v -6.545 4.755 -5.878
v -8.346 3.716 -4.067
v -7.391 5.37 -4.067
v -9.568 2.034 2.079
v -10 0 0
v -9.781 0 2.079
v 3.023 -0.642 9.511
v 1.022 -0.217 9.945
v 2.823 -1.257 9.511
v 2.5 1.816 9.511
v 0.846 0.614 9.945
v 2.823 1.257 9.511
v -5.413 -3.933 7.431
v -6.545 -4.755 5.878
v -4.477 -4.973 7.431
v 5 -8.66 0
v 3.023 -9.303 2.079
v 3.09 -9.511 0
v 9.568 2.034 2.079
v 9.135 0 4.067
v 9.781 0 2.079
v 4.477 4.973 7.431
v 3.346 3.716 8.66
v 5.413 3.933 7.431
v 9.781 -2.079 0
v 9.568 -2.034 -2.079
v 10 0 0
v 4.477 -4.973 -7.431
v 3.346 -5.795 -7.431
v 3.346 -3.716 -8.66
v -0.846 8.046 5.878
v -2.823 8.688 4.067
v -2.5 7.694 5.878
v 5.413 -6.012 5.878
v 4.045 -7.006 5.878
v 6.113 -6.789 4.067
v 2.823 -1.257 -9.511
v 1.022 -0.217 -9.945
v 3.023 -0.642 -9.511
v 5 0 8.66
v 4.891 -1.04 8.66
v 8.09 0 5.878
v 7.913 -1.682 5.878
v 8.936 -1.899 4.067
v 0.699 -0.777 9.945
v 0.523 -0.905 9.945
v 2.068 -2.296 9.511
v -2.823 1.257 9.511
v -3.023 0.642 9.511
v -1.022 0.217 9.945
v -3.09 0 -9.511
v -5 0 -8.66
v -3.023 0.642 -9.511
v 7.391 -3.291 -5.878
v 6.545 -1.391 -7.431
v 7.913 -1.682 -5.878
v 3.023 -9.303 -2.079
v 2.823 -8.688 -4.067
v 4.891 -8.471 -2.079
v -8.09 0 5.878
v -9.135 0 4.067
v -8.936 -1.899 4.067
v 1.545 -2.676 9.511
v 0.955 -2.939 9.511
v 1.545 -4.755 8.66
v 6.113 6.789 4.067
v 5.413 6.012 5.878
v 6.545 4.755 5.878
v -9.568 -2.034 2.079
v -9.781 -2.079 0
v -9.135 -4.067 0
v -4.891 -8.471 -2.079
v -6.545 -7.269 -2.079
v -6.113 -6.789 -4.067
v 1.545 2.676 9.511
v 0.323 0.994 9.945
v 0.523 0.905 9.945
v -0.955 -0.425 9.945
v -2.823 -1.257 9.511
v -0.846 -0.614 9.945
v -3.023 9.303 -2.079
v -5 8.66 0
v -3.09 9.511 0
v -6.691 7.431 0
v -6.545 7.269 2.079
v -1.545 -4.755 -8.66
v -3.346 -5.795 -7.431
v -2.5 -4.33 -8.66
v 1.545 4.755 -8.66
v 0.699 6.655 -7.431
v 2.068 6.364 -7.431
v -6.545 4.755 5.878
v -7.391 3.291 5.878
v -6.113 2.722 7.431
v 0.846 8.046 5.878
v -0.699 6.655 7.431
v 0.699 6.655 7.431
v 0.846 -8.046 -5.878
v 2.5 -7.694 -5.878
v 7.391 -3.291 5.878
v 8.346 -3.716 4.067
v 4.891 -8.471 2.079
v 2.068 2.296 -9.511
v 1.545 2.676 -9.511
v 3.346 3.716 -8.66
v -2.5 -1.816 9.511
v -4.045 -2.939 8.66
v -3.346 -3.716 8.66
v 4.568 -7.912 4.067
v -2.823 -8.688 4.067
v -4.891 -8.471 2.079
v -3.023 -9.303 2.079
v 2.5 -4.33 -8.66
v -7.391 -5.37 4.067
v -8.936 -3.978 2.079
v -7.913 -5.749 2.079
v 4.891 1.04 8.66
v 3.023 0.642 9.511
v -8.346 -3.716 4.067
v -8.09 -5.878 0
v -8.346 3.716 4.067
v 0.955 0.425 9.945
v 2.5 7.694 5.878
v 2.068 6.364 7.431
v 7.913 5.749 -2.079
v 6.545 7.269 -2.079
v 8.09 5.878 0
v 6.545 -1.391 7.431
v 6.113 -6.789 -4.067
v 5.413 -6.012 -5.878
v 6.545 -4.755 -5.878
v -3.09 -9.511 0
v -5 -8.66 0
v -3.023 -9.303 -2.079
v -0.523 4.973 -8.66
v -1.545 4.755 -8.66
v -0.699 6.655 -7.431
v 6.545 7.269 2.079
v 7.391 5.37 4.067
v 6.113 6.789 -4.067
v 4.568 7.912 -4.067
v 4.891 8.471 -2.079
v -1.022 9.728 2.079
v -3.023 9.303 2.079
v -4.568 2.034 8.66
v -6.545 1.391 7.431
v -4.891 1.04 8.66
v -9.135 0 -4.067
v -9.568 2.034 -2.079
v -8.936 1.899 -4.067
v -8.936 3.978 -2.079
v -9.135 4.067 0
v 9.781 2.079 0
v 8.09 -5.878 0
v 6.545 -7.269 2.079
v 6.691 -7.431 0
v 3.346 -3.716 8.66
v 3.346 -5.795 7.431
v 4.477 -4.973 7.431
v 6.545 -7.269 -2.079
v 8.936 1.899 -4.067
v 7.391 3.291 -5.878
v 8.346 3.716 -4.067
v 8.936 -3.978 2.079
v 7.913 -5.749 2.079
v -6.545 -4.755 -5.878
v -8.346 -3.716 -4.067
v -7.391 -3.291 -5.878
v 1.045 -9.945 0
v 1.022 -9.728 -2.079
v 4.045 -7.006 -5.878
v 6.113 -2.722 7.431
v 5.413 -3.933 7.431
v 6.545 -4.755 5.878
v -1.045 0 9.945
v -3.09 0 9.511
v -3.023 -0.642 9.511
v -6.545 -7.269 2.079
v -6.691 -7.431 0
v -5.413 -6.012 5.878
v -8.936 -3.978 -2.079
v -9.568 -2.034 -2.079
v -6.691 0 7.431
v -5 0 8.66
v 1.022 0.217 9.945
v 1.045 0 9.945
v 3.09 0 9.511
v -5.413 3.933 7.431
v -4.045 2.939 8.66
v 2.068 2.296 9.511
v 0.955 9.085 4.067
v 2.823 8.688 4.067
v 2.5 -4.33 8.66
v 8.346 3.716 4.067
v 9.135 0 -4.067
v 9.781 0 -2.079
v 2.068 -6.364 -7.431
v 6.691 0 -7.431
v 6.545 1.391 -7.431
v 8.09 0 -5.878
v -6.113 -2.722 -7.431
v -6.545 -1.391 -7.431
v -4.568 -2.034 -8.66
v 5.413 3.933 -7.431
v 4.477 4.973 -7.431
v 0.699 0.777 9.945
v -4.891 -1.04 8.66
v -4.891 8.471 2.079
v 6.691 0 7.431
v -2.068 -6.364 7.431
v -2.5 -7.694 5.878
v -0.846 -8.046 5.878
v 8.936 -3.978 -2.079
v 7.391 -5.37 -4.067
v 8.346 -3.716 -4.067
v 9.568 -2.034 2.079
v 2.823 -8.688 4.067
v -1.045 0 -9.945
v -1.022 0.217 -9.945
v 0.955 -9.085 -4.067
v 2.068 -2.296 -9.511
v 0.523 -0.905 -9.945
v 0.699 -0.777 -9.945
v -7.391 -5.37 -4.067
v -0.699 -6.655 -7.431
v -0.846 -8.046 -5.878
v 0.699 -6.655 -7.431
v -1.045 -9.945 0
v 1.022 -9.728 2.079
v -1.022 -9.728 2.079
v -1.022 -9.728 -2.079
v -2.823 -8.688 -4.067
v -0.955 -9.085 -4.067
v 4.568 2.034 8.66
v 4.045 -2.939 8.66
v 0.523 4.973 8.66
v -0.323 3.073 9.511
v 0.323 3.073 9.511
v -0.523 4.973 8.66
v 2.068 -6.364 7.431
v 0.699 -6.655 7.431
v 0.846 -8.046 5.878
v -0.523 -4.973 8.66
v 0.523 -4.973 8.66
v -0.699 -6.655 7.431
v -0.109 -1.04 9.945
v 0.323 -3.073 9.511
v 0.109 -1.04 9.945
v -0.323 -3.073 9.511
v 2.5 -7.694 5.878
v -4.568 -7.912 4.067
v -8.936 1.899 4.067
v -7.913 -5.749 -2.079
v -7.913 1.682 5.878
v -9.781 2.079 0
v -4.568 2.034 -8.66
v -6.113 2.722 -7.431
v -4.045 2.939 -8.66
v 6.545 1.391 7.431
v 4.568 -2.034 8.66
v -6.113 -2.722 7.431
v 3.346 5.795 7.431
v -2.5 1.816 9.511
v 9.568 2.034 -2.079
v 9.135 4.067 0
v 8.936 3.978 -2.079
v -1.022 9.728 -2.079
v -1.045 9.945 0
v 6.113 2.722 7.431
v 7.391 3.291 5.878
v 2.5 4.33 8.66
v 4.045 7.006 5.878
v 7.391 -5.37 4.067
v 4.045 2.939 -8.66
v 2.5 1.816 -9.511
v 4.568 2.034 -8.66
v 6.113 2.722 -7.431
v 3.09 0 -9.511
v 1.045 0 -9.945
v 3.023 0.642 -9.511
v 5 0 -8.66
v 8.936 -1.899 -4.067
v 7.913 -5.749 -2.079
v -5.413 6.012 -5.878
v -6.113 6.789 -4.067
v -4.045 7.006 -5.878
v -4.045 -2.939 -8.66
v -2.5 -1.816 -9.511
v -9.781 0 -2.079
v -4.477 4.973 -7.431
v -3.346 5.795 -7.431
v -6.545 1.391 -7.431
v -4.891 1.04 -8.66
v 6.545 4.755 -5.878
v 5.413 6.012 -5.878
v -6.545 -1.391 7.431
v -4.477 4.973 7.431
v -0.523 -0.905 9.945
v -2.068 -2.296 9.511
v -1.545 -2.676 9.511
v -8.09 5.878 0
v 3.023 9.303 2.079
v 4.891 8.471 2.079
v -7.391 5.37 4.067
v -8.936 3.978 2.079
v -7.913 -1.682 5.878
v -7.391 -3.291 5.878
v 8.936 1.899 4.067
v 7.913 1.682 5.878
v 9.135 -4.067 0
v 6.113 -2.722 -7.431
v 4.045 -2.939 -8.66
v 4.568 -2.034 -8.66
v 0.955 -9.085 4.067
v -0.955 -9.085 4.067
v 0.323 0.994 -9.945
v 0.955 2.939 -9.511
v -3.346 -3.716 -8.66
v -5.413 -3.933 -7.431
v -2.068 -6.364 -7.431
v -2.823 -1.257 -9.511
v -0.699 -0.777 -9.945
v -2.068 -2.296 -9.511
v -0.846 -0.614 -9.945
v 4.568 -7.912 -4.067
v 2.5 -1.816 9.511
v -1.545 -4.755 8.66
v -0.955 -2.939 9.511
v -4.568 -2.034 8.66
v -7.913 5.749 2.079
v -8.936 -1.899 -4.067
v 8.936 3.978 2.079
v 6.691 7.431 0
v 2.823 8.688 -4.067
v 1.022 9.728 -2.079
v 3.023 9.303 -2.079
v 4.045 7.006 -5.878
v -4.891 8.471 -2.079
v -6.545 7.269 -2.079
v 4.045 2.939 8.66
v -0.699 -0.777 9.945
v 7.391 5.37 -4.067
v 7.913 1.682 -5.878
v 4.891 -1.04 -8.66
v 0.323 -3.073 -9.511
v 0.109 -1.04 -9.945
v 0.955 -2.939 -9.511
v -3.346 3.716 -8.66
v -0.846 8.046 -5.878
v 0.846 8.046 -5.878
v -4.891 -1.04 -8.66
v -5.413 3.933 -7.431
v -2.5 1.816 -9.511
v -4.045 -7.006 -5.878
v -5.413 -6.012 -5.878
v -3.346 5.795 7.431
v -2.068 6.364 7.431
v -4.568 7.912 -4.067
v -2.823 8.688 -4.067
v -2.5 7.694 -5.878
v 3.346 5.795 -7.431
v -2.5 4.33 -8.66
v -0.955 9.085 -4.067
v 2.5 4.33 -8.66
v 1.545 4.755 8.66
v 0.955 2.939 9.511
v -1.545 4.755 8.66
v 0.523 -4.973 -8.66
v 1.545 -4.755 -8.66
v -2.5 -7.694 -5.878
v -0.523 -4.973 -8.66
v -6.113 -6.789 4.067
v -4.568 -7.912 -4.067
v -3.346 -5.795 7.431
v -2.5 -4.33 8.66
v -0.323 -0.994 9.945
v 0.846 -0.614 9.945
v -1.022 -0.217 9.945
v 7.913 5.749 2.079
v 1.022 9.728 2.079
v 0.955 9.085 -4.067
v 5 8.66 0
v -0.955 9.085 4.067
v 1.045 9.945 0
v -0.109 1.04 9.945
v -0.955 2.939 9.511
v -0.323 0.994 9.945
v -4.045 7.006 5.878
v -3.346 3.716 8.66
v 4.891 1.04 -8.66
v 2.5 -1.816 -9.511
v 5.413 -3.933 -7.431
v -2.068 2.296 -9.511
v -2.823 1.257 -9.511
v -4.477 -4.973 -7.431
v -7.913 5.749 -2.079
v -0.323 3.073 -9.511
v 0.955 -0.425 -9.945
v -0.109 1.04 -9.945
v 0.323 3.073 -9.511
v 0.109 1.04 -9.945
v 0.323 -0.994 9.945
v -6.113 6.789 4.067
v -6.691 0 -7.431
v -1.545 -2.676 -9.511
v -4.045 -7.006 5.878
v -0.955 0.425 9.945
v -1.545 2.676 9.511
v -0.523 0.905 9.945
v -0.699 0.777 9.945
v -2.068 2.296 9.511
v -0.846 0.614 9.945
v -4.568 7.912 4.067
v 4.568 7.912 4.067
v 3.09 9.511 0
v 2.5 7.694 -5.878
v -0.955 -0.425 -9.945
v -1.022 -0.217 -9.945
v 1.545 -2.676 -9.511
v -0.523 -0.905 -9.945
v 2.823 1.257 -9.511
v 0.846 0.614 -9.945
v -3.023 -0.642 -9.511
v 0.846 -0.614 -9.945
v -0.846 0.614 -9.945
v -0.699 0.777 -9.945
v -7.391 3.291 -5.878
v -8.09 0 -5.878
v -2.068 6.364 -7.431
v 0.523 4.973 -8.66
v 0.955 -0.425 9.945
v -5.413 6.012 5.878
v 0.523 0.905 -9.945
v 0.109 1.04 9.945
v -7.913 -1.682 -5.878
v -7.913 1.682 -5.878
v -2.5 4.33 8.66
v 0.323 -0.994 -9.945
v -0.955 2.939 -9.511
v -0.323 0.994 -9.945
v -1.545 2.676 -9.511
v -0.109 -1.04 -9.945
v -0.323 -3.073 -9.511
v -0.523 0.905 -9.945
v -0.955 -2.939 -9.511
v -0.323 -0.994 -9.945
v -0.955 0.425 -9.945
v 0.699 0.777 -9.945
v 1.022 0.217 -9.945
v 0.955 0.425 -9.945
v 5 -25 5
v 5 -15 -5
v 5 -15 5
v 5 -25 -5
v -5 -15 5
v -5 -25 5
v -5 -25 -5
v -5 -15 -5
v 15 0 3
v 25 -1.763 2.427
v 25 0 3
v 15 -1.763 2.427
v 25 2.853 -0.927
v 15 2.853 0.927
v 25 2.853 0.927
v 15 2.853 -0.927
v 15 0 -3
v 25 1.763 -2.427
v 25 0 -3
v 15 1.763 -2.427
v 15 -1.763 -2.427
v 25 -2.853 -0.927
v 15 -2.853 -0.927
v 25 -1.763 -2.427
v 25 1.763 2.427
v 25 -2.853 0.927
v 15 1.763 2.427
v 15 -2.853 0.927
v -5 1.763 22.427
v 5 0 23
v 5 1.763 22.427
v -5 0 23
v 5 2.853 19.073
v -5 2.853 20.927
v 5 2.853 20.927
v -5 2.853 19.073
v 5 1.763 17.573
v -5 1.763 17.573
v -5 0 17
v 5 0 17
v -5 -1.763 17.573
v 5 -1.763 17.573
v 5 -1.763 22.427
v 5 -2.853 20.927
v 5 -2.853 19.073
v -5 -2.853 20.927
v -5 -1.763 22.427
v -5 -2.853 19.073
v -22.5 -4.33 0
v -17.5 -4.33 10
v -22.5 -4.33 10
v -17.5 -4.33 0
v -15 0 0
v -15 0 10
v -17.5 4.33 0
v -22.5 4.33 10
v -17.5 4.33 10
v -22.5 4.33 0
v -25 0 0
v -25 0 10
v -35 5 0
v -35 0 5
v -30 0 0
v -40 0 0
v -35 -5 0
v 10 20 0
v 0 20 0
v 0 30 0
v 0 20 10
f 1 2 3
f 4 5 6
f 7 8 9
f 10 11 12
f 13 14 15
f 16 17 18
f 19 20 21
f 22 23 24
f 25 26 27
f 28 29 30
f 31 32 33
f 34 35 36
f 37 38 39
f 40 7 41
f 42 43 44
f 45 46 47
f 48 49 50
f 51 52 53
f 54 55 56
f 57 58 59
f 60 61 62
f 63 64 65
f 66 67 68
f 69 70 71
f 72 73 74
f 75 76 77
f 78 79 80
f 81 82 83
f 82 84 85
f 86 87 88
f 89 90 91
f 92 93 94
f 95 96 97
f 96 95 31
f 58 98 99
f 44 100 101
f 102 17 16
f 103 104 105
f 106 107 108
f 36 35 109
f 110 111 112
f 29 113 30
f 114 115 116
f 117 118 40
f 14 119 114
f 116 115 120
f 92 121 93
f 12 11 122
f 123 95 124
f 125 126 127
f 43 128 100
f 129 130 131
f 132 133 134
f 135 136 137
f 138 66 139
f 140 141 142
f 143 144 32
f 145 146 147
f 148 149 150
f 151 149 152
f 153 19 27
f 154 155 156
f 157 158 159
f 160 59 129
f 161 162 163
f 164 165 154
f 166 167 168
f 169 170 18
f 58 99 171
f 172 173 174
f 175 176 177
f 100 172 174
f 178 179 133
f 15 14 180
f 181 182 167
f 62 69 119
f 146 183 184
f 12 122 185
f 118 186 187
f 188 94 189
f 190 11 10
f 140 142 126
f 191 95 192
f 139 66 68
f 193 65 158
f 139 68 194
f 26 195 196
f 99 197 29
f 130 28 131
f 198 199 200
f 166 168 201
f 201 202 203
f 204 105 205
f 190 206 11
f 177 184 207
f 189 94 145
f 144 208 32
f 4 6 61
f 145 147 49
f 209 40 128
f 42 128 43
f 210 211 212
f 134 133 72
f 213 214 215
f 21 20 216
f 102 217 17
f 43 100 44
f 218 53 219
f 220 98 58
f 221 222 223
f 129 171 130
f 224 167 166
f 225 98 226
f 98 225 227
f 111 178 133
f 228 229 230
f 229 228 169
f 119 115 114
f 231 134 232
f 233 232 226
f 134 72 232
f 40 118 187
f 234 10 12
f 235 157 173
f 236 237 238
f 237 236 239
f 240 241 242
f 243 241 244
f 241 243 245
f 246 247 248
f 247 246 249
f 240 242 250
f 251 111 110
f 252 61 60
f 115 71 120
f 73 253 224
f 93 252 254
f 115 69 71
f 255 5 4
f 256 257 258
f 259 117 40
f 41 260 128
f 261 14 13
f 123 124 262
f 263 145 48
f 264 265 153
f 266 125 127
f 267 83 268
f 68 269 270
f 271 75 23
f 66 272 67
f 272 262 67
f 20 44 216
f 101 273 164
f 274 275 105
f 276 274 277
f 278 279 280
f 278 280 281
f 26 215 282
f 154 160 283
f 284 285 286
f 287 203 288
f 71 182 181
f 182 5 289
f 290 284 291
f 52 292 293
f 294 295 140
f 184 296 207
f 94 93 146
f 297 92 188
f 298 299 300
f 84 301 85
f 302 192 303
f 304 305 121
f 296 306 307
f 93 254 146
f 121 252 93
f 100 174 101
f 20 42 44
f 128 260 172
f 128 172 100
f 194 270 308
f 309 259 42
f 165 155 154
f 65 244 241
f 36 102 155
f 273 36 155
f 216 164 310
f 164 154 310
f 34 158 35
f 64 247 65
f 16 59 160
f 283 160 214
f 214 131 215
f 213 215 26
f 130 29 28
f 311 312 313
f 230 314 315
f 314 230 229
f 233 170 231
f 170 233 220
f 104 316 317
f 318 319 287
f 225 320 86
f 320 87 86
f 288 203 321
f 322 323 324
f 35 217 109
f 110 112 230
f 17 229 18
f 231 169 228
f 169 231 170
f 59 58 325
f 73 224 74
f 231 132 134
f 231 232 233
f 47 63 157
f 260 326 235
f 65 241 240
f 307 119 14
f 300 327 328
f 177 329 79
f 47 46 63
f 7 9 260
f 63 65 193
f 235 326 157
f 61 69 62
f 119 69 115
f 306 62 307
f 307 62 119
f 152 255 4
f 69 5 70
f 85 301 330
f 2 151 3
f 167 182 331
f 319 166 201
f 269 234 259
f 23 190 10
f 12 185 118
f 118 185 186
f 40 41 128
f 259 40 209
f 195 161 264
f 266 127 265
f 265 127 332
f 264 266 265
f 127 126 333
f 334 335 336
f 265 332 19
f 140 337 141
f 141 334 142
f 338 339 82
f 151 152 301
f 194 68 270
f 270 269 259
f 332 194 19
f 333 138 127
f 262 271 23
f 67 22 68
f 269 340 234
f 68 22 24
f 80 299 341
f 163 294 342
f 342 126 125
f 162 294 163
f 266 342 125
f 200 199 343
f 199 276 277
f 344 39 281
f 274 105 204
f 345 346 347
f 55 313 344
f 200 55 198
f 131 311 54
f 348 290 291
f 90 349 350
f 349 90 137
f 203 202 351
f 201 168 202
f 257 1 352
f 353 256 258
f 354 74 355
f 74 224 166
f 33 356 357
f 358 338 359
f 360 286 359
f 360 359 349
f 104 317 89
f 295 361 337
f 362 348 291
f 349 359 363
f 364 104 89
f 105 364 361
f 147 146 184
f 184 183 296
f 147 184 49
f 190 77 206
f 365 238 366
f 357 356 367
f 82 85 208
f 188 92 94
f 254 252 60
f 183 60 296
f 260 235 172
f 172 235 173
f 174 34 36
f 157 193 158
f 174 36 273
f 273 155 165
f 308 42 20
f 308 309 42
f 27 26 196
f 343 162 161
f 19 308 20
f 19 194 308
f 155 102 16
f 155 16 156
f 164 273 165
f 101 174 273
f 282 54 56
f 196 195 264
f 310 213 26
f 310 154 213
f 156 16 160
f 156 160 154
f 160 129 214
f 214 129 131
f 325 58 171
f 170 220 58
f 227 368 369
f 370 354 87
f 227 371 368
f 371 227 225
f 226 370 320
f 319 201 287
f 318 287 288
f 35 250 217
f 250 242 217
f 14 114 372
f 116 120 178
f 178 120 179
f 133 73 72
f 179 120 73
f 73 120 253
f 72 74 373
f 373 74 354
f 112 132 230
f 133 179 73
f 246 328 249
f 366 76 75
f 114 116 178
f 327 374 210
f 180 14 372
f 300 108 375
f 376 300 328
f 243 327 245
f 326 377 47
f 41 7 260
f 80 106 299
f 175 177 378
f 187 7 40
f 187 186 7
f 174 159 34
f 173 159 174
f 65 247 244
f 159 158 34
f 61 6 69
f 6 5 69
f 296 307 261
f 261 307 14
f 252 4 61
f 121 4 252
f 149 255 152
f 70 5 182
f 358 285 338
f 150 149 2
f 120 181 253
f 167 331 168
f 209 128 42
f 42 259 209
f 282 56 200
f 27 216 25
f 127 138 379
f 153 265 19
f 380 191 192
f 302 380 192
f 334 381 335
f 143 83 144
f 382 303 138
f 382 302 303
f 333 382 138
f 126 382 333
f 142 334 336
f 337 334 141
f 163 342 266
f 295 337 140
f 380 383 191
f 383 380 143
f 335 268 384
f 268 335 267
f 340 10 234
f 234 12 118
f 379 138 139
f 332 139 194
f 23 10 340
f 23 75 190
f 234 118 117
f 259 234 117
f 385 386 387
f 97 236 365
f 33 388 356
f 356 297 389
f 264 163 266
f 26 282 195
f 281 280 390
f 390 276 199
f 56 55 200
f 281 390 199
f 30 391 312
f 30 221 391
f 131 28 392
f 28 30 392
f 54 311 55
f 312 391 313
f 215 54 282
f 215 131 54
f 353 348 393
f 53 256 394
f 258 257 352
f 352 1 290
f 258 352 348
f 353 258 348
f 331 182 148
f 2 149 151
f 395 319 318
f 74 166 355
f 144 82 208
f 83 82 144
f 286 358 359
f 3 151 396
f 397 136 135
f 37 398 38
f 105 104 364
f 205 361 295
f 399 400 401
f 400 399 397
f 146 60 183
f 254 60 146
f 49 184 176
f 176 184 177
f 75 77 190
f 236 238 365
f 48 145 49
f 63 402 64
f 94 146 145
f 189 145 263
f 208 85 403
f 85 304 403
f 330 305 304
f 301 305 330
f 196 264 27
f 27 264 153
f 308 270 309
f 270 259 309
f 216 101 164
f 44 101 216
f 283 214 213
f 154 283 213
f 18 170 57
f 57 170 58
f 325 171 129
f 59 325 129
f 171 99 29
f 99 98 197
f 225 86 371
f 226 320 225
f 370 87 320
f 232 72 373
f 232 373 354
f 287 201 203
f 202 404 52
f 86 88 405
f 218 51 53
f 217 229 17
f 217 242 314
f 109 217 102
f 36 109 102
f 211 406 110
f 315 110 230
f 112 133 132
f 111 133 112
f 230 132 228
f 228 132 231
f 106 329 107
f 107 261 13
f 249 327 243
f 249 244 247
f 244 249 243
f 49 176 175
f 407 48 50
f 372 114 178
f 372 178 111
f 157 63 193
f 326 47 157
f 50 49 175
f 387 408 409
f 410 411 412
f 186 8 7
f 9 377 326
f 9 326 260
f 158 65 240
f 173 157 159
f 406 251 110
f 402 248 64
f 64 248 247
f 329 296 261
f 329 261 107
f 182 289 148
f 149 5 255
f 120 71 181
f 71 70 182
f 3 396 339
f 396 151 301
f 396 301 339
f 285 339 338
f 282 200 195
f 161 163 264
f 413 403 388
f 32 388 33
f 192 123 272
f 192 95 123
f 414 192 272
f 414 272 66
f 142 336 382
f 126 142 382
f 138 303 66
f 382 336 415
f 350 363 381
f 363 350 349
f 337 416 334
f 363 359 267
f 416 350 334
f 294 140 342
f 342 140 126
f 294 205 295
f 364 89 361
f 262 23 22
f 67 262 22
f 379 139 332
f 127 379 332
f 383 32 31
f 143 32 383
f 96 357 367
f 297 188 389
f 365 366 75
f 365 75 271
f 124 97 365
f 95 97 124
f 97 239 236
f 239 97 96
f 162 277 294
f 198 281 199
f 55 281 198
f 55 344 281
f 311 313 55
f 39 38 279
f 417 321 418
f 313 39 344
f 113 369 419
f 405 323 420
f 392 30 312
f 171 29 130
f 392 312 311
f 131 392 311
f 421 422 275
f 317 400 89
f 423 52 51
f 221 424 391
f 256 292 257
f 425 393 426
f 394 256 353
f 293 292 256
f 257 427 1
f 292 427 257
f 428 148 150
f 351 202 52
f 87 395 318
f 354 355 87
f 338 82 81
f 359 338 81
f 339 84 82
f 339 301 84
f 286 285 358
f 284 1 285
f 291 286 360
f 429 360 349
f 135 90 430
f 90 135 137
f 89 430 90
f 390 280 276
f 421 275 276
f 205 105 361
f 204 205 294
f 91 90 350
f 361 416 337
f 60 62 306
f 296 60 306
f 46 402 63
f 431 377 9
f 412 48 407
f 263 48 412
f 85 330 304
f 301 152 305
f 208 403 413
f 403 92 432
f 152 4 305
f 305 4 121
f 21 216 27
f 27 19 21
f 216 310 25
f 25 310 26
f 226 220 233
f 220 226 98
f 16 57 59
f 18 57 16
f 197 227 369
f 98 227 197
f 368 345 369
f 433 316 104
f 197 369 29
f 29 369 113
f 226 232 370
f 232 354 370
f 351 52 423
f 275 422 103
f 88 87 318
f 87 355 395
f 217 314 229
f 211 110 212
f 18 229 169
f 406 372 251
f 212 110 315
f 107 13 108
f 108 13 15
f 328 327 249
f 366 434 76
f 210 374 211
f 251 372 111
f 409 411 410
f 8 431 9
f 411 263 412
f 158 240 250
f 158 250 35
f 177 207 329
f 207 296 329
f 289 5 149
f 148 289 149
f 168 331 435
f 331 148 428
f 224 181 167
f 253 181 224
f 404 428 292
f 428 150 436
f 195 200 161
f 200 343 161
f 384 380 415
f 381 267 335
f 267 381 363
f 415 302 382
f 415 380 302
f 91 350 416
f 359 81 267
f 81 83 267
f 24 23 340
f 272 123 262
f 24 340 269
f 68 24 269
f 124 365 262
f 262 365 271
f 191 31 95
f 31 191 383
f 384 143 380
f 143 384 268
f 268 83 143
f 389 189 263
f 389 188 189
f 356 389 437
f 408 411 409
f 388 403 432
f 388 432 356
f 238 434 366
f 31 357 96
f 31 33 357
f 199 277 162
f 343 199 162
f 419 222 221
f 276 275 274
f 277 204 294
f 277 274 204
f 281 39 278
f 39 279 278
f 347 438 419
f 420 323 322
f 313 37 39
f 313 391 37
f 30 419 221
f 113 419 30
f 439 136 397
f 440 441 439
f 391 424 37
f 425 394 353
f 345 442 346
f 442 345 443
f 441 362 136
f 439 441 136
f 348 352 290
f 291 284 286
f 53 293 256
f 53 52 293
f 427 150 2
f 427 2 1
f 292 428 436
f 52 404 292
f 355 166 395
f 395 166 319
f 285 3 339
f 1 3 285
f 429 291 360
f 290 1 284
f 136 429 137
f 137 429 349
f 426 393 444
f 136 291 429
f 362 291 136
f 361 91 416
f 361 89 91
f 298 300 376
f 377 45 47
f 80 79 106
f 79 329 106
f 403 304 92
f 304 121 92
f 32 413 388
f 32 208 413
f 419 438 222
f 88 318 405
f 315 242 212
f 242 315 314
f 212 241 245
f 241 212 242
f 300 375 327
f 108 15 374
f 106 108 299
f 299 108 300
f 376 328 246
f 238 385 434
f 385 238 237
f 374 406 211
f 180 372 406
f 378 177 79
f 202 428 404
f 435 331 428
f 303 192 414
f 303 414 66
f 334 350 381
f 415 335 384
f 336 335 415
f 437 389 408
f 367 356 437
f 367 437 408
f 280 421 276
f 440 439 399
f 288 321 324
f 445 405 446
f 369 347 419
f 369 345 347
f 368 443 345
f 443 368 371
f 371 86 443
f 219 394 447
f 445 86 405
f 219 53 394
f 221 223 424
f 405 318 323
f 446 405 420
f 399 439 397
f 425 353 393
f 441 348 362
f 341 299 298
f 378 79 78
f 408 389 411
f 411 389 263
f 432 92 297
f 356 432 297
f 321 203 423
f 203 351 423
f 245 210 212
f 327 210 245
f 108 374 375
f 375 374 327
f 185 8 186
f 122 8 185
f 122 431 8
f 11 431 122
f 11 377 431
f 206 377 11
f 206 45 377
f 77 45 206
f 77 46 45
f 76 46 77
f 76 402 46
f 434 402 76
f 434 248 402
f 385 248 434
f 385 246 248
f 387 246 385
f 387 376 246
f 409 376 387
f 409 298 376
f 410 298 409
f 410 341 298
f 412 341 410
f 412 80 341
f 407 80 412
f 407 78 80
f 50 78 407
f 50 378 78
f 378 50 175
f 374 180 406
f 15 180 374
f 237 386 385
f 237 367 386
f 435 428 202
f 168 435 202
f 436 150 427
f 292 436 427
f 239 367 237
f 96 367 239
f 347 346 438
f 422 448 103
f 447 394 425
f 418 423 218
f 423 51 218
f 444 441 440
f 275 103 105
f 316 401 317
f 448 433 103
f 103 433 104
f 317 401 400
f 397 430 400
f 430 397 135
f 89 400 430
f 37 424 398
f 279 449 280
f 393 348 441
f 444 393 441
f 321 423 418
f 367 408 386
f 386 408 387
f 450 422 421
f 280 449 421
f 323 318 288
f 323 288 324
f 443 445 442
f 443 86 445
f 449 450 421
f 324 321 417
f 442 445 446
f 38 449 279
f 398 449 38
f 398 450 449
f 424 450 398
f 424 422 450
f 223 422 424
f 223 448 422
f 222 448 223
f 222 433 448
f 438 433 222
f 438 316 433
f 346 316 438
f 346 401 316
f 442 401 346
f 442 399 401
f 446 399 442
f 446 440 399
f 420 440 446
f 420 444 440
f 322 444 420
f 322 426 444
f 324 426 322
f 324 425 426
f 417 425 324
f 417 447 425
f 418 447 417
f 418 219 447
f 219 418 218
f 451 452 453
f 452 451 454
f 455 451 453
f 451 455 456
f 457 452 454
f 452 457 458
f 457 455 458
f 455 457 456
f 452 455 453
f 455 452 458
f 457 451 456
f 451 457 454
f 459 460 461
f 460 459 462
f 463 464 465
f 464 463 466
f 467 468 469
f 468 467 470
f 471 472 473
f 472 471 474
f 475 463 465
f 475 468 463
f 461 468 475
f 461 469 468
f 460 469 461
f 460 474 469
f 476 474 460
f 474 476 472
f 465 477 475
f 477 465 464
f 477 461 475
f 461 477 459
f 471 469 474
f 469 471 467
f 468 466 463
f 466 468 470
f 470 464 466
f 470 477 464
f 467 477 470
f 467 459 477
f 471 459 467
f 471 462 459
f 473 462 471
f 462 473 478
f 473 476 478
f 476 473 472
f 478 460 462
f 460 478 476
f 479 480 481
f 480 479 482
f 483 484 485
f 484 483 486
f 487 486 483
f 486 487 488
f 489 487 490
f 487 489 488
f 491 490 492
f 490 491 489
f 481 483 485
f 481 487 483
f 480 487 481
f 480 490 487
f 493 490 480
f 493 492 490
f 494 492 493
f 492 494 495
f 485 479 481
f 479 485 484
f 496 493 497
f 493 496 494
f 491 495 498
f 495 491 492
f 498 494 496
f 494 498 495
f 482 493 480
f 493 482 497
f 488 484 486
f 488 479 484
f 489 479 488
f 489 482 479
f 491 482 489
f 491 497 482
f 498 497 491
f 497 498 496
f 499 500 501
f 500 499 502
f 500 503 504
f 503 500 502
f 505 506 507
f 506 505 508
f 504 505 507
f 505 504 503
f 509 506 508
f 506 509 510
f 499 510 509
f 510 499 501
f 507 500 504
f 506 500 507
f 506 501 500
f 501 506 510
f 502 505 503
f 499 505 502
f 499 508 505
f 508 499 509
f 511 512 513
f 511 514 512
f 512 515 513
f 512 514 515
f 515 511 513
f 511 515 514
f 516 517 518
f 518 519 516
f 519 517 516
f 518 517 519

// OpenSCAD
/* Tutorial 1 - Basic 3D drawing */

/* Comments are C-style, and lines must end with a semicolon */
// Or you can use C++ style if that's your thing

/* There are a few useful special symbols which can be used to modify the
 * behaviour of a node:
 * !: Dicards all other nodes and renders only this one (and its children) as
 *    though it were the only one
 * *: Ignore this node and all children (often easier than commenting out)
 * %: Make this mode (and its children) render as "transparent"
 * #: Make this node (and its children) render in "debug" mode - translucent
 *    pink.
 */

/* 3D fundamental shapes are easy */
sphere(r = 10, center = true);

/* Operations are chained */
translate([0, -20, 0]) cube(10, center = true);

/* They are evaluated right-to-left */
color("red") translate([20, 0, 0]) rotate([0, 90, 0])
	cylinder(r = 3, h = 10, center = true);
color([0, 1, 0, 0.5]) rotate([0, -90, 0]) translate([20, 0, 0])
	cylinder(r = 3, h = 10, center = true);

/* The special variable $fn changes how rounded things are */
translate([-20, 0, 0]) cylinder(r = 5, h = 10, $fn = 6);
translate([-35, 0, 0]) cylinder(r1 = 5, r2 = 0, h = 5, $fn = 4);

/* You can draw polyhedrons using vertices and triangles too */
translate([0, 20, 0]) {
	polyhedron(points = [ [0, 0, 0], [10, 0, 0], [0, 10, 0], [0, 0, 10] ],
		/* Beware of "winding order" - points should go clockwise when
		 * looking at the "outside" of the triangle */
		faces = [ [0, 1, 2], [0, 2, 3], [0, 3, 1], [2, 1, 3] ]);
}
